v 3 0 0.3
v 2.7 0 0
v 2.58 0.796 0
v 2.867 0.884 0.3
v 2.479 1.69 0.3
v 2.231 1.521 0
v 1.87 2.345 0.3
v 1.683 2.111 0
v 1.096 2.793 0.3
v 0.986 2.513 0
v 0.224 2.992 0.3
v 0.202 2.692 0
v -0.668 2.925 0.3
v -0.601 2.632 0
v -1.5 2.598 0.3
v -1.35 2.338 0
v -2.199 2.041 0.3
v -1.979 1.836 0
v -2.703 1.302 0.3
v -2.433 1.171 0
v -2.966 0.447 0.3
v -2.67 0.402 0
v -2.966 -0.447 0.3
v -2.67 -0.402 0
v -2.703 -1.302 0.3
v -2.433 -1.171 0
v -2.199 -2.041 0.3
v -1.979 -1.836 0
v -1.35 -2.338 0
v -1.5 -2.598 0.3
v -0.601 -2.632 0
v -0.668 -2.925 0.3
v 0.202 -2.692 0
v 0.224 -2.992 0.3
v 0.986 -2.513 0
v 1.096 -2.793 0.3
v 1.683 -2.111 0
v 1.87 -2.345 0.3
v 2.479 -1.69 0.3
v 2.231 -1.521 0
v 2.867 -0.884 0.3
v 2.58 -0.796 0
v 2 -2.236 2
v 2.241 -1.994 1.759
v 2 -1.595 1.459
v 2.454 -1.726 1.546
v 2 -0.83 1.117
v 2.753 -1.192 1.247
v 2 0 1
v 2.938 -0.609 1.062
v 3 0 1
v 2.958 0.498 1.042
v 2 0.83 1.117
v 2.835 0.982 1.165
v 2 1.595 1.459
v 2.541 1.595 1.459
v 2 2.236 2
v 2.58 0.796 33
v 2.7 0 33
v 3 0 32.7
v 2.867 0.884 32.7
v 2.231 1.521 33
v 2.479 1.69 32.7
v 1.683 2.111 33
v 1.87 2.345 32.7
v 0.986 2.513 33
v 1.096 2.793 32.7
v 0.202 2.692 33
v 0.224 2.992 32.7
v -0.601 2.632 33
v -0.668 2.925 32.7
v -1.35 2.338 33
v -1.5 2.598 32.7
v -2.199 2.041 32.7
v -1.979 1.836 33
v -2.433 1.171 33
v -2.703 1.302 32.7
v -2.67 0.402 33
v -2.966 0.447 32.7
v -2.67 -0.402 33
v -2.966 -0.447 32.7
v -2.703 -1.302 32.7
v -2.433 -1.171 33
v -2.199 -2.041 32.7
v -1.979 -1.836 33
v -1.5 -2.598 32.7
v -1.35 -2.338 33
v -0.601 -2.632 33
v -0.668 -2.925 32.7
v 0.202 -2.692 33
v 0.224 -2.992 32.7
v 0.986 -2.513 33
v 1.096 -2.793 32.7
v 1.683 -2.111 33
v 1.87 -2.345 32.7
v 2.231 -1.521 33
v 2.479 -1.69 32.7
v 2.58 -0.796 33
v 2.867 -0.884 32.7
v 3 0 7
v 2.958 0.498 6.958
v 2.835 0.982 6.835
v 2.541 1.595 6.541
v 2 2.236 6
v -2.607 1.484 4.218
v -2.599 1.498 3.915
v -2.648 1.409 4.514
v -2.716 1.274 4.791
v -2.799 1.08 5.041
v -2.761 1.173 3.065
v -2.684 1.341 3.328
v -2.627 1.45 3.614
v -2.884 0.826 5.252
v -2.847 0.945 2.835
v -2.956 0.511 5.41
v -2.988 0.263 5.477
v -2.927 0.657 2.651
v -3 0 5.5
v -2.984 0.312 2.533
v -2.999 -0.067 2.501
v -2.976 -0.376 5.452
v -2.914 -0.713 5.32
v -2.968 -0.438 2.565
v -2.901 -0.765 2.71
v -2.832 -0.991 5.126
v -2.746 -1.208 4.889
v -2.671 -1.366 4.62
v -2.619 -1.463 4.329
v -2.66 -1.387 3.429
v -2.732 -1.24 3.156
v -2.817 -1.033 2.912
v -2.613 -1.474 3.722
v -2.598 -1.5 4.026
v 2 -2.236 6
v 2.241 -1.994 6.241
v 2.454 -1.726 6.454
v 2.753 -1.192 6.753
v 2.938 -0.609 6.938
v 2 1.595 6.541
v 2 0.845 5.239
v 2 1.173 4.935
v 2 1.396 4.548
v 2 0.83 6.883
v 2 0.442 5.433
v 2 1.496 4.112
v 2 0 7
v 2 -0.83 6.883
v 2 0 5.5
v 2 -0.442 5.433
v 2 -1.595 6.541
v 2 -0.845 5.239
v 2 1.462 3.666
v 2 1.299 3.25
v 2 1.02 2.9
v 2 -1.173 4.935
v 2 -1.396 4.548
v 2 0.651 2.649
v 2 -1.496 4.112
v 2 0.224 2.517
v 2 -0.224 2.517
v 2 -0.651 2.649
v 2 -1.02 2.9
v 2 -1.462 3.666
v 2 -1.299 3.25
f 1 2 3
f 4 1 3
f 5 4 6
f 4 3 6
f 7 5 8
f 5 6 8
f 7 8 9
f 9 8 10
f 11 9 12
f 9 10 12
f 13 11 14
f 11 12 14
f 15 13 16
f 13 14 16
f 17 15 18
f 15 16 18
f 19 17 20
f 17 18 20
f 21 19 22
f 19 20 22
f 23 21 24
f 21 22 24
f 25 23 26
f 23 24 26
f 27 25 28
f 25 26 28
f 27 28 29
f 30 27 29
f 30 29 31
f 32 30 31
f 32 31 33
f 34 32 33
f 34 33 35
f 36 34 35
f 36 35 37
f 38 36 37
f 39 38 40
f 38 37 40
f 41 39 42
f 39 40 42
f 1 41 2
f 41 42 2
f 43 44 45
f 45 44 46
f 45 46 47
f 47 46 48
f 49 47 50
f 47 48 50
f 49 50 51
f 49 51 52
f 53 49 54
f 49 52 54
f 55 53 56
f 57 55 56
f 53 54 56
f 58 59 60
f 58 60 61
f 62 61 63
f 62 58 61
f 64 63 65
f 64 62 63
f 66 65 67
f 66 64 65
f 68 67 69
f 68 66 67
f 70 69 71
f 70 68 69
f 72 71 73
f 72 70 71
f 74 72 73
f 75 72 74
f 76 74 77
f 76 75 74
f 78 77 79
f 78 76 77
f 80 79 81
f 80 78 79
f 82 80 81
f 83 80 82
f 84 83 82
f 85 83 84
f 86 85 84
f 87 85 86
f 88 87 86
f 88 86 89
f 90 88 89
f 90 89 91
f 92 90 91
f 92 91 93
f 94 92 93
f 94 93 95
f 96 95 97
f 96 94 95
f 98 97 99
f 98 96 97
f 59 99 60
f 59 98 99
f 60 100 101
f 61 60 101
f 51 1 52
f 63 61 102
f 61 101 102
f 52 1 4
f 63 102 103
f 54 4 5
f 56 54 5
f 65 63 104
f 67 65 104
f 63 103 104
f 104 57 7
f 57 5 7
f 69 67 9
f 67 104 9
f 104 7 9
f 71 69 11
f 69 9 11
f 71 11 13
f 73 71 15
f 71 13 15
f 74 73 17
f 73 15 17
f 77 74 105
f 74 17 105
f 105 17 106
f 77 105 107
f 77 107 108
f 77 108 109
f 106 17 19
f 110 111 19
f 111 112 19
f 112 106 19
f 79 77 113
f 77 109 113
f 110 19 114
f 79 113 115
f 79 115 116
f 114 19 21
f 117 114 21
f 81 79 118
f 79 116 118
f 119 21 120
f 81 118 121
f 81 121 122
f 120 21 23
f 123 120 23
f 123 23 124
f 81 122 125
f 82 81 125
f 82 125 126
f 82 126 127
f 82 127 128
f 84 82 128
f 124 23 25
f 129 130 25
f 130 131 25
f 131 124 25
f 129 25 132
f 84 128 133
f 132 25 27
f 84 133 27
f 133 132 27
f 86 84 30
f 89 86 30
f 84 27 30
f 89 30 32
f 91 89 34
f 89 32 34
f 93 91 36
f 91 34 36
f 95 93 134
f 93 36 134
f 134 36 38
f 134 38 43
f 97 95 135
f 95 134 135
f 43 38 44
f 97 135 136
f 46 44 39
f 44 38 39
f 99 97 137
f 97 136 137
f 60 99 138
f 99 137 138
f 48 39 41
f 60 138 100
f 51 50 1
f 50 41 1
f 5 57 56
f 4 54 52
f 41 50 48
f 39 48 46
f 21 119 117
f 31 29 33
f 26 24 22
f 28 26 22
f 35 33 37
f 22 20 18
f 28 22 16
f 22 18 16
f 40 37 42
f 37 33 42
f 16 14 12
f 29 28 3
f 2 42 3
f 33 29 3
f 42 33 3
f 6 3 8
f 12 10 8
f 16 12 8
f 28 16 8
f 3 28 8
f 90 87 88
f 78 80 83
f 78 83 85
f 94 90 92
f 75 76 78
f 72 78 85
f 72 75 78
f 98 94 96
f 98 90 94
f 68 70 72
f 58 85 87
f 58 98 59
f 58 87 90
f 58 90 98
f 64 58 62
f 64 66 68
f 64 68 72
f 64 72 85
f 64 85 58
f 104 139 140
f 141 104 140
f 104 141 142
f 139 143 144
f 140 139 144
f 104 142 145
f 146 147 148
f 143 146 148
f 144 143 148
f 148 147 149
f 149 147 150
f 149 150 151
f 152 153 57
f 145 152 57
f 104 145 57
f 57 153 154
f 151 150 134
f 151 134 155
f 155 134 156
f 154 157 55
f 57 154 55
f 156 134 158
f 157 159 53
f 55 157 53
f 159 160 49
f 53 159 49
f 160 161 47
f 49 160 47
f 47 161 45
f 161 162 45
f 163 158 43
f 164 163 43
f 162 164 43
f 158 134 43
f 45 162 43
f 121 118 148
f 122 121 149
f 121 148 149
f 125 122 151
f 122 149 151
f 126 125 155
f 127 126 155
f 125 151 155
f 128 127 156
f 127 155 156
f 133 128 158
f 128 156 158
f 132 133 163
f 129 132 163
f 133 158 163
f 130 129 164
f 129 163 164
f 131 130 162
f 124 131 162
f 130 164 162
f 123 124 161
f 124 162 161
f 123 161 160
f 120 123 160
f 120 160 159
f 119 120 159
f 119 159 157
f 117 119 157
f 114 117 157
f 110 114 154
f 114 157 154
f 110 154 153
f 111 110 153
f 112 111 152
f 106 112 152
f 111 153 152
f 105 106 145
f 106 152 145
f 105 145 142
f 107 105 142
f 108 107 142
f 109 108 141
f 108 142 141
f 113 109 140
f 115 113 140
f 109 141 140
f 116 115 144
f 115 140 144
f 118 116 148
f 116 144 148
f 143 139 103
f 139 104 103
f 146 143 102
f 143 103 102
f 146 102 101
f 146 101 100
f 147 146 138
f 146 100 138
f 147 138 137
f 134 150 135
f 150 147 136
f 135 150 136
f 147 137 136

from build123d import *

# Parameters (mm, degrees)
ESQUISSE1_R        = 3
BOSS_EXTRU_1_DEPTH = 33
CHANFREIN1_SIZE    = 0.3


with BuildPart() as part:
    # Esquisse1 → Boss.-Extru.1 (new body)
    with BuildSketch(Plane.XY):
        Circle(ESQUISSE1_R)
    extrude(amount=BOSS_EXTRU_1_DEPTH)

    # Esquisse2 → Enlèvement de matière-Révolution1 (revolve, cut)
    with BuildSketch(Plane(origin=(0, 0, 0), x_dir=(1, 0, 0), z_dir=(0, 1, 0)), mode=Mode.PRIVATE) as enl_vement_de_mati_re_r_volution1_sk:
        Polygon((-10, -2.5), (2, -2.5), (2, -1), (10, -1), (10, -4), (-10, -4), align=None)
    revolve(enl_vement_de_mati_re_r_volution1_sk.sketch.rotate(Axis((10, 0, 4), (1, 0, 0)), 180), axis=Axis((10, 0, 4), (1, 0, 0)), mode=Mode.SUBTRACT)

    # Chanfrein1
    chanfrein1_edges = [part.edges().sort_by_distance(p)[0] for p in [
        (-3, 0, 0),
        (-3, 0, 33),
    ]]
    chamfer(chanfrein1_edges, length=CHANFREIN1_SIZE)


solid = part.part
